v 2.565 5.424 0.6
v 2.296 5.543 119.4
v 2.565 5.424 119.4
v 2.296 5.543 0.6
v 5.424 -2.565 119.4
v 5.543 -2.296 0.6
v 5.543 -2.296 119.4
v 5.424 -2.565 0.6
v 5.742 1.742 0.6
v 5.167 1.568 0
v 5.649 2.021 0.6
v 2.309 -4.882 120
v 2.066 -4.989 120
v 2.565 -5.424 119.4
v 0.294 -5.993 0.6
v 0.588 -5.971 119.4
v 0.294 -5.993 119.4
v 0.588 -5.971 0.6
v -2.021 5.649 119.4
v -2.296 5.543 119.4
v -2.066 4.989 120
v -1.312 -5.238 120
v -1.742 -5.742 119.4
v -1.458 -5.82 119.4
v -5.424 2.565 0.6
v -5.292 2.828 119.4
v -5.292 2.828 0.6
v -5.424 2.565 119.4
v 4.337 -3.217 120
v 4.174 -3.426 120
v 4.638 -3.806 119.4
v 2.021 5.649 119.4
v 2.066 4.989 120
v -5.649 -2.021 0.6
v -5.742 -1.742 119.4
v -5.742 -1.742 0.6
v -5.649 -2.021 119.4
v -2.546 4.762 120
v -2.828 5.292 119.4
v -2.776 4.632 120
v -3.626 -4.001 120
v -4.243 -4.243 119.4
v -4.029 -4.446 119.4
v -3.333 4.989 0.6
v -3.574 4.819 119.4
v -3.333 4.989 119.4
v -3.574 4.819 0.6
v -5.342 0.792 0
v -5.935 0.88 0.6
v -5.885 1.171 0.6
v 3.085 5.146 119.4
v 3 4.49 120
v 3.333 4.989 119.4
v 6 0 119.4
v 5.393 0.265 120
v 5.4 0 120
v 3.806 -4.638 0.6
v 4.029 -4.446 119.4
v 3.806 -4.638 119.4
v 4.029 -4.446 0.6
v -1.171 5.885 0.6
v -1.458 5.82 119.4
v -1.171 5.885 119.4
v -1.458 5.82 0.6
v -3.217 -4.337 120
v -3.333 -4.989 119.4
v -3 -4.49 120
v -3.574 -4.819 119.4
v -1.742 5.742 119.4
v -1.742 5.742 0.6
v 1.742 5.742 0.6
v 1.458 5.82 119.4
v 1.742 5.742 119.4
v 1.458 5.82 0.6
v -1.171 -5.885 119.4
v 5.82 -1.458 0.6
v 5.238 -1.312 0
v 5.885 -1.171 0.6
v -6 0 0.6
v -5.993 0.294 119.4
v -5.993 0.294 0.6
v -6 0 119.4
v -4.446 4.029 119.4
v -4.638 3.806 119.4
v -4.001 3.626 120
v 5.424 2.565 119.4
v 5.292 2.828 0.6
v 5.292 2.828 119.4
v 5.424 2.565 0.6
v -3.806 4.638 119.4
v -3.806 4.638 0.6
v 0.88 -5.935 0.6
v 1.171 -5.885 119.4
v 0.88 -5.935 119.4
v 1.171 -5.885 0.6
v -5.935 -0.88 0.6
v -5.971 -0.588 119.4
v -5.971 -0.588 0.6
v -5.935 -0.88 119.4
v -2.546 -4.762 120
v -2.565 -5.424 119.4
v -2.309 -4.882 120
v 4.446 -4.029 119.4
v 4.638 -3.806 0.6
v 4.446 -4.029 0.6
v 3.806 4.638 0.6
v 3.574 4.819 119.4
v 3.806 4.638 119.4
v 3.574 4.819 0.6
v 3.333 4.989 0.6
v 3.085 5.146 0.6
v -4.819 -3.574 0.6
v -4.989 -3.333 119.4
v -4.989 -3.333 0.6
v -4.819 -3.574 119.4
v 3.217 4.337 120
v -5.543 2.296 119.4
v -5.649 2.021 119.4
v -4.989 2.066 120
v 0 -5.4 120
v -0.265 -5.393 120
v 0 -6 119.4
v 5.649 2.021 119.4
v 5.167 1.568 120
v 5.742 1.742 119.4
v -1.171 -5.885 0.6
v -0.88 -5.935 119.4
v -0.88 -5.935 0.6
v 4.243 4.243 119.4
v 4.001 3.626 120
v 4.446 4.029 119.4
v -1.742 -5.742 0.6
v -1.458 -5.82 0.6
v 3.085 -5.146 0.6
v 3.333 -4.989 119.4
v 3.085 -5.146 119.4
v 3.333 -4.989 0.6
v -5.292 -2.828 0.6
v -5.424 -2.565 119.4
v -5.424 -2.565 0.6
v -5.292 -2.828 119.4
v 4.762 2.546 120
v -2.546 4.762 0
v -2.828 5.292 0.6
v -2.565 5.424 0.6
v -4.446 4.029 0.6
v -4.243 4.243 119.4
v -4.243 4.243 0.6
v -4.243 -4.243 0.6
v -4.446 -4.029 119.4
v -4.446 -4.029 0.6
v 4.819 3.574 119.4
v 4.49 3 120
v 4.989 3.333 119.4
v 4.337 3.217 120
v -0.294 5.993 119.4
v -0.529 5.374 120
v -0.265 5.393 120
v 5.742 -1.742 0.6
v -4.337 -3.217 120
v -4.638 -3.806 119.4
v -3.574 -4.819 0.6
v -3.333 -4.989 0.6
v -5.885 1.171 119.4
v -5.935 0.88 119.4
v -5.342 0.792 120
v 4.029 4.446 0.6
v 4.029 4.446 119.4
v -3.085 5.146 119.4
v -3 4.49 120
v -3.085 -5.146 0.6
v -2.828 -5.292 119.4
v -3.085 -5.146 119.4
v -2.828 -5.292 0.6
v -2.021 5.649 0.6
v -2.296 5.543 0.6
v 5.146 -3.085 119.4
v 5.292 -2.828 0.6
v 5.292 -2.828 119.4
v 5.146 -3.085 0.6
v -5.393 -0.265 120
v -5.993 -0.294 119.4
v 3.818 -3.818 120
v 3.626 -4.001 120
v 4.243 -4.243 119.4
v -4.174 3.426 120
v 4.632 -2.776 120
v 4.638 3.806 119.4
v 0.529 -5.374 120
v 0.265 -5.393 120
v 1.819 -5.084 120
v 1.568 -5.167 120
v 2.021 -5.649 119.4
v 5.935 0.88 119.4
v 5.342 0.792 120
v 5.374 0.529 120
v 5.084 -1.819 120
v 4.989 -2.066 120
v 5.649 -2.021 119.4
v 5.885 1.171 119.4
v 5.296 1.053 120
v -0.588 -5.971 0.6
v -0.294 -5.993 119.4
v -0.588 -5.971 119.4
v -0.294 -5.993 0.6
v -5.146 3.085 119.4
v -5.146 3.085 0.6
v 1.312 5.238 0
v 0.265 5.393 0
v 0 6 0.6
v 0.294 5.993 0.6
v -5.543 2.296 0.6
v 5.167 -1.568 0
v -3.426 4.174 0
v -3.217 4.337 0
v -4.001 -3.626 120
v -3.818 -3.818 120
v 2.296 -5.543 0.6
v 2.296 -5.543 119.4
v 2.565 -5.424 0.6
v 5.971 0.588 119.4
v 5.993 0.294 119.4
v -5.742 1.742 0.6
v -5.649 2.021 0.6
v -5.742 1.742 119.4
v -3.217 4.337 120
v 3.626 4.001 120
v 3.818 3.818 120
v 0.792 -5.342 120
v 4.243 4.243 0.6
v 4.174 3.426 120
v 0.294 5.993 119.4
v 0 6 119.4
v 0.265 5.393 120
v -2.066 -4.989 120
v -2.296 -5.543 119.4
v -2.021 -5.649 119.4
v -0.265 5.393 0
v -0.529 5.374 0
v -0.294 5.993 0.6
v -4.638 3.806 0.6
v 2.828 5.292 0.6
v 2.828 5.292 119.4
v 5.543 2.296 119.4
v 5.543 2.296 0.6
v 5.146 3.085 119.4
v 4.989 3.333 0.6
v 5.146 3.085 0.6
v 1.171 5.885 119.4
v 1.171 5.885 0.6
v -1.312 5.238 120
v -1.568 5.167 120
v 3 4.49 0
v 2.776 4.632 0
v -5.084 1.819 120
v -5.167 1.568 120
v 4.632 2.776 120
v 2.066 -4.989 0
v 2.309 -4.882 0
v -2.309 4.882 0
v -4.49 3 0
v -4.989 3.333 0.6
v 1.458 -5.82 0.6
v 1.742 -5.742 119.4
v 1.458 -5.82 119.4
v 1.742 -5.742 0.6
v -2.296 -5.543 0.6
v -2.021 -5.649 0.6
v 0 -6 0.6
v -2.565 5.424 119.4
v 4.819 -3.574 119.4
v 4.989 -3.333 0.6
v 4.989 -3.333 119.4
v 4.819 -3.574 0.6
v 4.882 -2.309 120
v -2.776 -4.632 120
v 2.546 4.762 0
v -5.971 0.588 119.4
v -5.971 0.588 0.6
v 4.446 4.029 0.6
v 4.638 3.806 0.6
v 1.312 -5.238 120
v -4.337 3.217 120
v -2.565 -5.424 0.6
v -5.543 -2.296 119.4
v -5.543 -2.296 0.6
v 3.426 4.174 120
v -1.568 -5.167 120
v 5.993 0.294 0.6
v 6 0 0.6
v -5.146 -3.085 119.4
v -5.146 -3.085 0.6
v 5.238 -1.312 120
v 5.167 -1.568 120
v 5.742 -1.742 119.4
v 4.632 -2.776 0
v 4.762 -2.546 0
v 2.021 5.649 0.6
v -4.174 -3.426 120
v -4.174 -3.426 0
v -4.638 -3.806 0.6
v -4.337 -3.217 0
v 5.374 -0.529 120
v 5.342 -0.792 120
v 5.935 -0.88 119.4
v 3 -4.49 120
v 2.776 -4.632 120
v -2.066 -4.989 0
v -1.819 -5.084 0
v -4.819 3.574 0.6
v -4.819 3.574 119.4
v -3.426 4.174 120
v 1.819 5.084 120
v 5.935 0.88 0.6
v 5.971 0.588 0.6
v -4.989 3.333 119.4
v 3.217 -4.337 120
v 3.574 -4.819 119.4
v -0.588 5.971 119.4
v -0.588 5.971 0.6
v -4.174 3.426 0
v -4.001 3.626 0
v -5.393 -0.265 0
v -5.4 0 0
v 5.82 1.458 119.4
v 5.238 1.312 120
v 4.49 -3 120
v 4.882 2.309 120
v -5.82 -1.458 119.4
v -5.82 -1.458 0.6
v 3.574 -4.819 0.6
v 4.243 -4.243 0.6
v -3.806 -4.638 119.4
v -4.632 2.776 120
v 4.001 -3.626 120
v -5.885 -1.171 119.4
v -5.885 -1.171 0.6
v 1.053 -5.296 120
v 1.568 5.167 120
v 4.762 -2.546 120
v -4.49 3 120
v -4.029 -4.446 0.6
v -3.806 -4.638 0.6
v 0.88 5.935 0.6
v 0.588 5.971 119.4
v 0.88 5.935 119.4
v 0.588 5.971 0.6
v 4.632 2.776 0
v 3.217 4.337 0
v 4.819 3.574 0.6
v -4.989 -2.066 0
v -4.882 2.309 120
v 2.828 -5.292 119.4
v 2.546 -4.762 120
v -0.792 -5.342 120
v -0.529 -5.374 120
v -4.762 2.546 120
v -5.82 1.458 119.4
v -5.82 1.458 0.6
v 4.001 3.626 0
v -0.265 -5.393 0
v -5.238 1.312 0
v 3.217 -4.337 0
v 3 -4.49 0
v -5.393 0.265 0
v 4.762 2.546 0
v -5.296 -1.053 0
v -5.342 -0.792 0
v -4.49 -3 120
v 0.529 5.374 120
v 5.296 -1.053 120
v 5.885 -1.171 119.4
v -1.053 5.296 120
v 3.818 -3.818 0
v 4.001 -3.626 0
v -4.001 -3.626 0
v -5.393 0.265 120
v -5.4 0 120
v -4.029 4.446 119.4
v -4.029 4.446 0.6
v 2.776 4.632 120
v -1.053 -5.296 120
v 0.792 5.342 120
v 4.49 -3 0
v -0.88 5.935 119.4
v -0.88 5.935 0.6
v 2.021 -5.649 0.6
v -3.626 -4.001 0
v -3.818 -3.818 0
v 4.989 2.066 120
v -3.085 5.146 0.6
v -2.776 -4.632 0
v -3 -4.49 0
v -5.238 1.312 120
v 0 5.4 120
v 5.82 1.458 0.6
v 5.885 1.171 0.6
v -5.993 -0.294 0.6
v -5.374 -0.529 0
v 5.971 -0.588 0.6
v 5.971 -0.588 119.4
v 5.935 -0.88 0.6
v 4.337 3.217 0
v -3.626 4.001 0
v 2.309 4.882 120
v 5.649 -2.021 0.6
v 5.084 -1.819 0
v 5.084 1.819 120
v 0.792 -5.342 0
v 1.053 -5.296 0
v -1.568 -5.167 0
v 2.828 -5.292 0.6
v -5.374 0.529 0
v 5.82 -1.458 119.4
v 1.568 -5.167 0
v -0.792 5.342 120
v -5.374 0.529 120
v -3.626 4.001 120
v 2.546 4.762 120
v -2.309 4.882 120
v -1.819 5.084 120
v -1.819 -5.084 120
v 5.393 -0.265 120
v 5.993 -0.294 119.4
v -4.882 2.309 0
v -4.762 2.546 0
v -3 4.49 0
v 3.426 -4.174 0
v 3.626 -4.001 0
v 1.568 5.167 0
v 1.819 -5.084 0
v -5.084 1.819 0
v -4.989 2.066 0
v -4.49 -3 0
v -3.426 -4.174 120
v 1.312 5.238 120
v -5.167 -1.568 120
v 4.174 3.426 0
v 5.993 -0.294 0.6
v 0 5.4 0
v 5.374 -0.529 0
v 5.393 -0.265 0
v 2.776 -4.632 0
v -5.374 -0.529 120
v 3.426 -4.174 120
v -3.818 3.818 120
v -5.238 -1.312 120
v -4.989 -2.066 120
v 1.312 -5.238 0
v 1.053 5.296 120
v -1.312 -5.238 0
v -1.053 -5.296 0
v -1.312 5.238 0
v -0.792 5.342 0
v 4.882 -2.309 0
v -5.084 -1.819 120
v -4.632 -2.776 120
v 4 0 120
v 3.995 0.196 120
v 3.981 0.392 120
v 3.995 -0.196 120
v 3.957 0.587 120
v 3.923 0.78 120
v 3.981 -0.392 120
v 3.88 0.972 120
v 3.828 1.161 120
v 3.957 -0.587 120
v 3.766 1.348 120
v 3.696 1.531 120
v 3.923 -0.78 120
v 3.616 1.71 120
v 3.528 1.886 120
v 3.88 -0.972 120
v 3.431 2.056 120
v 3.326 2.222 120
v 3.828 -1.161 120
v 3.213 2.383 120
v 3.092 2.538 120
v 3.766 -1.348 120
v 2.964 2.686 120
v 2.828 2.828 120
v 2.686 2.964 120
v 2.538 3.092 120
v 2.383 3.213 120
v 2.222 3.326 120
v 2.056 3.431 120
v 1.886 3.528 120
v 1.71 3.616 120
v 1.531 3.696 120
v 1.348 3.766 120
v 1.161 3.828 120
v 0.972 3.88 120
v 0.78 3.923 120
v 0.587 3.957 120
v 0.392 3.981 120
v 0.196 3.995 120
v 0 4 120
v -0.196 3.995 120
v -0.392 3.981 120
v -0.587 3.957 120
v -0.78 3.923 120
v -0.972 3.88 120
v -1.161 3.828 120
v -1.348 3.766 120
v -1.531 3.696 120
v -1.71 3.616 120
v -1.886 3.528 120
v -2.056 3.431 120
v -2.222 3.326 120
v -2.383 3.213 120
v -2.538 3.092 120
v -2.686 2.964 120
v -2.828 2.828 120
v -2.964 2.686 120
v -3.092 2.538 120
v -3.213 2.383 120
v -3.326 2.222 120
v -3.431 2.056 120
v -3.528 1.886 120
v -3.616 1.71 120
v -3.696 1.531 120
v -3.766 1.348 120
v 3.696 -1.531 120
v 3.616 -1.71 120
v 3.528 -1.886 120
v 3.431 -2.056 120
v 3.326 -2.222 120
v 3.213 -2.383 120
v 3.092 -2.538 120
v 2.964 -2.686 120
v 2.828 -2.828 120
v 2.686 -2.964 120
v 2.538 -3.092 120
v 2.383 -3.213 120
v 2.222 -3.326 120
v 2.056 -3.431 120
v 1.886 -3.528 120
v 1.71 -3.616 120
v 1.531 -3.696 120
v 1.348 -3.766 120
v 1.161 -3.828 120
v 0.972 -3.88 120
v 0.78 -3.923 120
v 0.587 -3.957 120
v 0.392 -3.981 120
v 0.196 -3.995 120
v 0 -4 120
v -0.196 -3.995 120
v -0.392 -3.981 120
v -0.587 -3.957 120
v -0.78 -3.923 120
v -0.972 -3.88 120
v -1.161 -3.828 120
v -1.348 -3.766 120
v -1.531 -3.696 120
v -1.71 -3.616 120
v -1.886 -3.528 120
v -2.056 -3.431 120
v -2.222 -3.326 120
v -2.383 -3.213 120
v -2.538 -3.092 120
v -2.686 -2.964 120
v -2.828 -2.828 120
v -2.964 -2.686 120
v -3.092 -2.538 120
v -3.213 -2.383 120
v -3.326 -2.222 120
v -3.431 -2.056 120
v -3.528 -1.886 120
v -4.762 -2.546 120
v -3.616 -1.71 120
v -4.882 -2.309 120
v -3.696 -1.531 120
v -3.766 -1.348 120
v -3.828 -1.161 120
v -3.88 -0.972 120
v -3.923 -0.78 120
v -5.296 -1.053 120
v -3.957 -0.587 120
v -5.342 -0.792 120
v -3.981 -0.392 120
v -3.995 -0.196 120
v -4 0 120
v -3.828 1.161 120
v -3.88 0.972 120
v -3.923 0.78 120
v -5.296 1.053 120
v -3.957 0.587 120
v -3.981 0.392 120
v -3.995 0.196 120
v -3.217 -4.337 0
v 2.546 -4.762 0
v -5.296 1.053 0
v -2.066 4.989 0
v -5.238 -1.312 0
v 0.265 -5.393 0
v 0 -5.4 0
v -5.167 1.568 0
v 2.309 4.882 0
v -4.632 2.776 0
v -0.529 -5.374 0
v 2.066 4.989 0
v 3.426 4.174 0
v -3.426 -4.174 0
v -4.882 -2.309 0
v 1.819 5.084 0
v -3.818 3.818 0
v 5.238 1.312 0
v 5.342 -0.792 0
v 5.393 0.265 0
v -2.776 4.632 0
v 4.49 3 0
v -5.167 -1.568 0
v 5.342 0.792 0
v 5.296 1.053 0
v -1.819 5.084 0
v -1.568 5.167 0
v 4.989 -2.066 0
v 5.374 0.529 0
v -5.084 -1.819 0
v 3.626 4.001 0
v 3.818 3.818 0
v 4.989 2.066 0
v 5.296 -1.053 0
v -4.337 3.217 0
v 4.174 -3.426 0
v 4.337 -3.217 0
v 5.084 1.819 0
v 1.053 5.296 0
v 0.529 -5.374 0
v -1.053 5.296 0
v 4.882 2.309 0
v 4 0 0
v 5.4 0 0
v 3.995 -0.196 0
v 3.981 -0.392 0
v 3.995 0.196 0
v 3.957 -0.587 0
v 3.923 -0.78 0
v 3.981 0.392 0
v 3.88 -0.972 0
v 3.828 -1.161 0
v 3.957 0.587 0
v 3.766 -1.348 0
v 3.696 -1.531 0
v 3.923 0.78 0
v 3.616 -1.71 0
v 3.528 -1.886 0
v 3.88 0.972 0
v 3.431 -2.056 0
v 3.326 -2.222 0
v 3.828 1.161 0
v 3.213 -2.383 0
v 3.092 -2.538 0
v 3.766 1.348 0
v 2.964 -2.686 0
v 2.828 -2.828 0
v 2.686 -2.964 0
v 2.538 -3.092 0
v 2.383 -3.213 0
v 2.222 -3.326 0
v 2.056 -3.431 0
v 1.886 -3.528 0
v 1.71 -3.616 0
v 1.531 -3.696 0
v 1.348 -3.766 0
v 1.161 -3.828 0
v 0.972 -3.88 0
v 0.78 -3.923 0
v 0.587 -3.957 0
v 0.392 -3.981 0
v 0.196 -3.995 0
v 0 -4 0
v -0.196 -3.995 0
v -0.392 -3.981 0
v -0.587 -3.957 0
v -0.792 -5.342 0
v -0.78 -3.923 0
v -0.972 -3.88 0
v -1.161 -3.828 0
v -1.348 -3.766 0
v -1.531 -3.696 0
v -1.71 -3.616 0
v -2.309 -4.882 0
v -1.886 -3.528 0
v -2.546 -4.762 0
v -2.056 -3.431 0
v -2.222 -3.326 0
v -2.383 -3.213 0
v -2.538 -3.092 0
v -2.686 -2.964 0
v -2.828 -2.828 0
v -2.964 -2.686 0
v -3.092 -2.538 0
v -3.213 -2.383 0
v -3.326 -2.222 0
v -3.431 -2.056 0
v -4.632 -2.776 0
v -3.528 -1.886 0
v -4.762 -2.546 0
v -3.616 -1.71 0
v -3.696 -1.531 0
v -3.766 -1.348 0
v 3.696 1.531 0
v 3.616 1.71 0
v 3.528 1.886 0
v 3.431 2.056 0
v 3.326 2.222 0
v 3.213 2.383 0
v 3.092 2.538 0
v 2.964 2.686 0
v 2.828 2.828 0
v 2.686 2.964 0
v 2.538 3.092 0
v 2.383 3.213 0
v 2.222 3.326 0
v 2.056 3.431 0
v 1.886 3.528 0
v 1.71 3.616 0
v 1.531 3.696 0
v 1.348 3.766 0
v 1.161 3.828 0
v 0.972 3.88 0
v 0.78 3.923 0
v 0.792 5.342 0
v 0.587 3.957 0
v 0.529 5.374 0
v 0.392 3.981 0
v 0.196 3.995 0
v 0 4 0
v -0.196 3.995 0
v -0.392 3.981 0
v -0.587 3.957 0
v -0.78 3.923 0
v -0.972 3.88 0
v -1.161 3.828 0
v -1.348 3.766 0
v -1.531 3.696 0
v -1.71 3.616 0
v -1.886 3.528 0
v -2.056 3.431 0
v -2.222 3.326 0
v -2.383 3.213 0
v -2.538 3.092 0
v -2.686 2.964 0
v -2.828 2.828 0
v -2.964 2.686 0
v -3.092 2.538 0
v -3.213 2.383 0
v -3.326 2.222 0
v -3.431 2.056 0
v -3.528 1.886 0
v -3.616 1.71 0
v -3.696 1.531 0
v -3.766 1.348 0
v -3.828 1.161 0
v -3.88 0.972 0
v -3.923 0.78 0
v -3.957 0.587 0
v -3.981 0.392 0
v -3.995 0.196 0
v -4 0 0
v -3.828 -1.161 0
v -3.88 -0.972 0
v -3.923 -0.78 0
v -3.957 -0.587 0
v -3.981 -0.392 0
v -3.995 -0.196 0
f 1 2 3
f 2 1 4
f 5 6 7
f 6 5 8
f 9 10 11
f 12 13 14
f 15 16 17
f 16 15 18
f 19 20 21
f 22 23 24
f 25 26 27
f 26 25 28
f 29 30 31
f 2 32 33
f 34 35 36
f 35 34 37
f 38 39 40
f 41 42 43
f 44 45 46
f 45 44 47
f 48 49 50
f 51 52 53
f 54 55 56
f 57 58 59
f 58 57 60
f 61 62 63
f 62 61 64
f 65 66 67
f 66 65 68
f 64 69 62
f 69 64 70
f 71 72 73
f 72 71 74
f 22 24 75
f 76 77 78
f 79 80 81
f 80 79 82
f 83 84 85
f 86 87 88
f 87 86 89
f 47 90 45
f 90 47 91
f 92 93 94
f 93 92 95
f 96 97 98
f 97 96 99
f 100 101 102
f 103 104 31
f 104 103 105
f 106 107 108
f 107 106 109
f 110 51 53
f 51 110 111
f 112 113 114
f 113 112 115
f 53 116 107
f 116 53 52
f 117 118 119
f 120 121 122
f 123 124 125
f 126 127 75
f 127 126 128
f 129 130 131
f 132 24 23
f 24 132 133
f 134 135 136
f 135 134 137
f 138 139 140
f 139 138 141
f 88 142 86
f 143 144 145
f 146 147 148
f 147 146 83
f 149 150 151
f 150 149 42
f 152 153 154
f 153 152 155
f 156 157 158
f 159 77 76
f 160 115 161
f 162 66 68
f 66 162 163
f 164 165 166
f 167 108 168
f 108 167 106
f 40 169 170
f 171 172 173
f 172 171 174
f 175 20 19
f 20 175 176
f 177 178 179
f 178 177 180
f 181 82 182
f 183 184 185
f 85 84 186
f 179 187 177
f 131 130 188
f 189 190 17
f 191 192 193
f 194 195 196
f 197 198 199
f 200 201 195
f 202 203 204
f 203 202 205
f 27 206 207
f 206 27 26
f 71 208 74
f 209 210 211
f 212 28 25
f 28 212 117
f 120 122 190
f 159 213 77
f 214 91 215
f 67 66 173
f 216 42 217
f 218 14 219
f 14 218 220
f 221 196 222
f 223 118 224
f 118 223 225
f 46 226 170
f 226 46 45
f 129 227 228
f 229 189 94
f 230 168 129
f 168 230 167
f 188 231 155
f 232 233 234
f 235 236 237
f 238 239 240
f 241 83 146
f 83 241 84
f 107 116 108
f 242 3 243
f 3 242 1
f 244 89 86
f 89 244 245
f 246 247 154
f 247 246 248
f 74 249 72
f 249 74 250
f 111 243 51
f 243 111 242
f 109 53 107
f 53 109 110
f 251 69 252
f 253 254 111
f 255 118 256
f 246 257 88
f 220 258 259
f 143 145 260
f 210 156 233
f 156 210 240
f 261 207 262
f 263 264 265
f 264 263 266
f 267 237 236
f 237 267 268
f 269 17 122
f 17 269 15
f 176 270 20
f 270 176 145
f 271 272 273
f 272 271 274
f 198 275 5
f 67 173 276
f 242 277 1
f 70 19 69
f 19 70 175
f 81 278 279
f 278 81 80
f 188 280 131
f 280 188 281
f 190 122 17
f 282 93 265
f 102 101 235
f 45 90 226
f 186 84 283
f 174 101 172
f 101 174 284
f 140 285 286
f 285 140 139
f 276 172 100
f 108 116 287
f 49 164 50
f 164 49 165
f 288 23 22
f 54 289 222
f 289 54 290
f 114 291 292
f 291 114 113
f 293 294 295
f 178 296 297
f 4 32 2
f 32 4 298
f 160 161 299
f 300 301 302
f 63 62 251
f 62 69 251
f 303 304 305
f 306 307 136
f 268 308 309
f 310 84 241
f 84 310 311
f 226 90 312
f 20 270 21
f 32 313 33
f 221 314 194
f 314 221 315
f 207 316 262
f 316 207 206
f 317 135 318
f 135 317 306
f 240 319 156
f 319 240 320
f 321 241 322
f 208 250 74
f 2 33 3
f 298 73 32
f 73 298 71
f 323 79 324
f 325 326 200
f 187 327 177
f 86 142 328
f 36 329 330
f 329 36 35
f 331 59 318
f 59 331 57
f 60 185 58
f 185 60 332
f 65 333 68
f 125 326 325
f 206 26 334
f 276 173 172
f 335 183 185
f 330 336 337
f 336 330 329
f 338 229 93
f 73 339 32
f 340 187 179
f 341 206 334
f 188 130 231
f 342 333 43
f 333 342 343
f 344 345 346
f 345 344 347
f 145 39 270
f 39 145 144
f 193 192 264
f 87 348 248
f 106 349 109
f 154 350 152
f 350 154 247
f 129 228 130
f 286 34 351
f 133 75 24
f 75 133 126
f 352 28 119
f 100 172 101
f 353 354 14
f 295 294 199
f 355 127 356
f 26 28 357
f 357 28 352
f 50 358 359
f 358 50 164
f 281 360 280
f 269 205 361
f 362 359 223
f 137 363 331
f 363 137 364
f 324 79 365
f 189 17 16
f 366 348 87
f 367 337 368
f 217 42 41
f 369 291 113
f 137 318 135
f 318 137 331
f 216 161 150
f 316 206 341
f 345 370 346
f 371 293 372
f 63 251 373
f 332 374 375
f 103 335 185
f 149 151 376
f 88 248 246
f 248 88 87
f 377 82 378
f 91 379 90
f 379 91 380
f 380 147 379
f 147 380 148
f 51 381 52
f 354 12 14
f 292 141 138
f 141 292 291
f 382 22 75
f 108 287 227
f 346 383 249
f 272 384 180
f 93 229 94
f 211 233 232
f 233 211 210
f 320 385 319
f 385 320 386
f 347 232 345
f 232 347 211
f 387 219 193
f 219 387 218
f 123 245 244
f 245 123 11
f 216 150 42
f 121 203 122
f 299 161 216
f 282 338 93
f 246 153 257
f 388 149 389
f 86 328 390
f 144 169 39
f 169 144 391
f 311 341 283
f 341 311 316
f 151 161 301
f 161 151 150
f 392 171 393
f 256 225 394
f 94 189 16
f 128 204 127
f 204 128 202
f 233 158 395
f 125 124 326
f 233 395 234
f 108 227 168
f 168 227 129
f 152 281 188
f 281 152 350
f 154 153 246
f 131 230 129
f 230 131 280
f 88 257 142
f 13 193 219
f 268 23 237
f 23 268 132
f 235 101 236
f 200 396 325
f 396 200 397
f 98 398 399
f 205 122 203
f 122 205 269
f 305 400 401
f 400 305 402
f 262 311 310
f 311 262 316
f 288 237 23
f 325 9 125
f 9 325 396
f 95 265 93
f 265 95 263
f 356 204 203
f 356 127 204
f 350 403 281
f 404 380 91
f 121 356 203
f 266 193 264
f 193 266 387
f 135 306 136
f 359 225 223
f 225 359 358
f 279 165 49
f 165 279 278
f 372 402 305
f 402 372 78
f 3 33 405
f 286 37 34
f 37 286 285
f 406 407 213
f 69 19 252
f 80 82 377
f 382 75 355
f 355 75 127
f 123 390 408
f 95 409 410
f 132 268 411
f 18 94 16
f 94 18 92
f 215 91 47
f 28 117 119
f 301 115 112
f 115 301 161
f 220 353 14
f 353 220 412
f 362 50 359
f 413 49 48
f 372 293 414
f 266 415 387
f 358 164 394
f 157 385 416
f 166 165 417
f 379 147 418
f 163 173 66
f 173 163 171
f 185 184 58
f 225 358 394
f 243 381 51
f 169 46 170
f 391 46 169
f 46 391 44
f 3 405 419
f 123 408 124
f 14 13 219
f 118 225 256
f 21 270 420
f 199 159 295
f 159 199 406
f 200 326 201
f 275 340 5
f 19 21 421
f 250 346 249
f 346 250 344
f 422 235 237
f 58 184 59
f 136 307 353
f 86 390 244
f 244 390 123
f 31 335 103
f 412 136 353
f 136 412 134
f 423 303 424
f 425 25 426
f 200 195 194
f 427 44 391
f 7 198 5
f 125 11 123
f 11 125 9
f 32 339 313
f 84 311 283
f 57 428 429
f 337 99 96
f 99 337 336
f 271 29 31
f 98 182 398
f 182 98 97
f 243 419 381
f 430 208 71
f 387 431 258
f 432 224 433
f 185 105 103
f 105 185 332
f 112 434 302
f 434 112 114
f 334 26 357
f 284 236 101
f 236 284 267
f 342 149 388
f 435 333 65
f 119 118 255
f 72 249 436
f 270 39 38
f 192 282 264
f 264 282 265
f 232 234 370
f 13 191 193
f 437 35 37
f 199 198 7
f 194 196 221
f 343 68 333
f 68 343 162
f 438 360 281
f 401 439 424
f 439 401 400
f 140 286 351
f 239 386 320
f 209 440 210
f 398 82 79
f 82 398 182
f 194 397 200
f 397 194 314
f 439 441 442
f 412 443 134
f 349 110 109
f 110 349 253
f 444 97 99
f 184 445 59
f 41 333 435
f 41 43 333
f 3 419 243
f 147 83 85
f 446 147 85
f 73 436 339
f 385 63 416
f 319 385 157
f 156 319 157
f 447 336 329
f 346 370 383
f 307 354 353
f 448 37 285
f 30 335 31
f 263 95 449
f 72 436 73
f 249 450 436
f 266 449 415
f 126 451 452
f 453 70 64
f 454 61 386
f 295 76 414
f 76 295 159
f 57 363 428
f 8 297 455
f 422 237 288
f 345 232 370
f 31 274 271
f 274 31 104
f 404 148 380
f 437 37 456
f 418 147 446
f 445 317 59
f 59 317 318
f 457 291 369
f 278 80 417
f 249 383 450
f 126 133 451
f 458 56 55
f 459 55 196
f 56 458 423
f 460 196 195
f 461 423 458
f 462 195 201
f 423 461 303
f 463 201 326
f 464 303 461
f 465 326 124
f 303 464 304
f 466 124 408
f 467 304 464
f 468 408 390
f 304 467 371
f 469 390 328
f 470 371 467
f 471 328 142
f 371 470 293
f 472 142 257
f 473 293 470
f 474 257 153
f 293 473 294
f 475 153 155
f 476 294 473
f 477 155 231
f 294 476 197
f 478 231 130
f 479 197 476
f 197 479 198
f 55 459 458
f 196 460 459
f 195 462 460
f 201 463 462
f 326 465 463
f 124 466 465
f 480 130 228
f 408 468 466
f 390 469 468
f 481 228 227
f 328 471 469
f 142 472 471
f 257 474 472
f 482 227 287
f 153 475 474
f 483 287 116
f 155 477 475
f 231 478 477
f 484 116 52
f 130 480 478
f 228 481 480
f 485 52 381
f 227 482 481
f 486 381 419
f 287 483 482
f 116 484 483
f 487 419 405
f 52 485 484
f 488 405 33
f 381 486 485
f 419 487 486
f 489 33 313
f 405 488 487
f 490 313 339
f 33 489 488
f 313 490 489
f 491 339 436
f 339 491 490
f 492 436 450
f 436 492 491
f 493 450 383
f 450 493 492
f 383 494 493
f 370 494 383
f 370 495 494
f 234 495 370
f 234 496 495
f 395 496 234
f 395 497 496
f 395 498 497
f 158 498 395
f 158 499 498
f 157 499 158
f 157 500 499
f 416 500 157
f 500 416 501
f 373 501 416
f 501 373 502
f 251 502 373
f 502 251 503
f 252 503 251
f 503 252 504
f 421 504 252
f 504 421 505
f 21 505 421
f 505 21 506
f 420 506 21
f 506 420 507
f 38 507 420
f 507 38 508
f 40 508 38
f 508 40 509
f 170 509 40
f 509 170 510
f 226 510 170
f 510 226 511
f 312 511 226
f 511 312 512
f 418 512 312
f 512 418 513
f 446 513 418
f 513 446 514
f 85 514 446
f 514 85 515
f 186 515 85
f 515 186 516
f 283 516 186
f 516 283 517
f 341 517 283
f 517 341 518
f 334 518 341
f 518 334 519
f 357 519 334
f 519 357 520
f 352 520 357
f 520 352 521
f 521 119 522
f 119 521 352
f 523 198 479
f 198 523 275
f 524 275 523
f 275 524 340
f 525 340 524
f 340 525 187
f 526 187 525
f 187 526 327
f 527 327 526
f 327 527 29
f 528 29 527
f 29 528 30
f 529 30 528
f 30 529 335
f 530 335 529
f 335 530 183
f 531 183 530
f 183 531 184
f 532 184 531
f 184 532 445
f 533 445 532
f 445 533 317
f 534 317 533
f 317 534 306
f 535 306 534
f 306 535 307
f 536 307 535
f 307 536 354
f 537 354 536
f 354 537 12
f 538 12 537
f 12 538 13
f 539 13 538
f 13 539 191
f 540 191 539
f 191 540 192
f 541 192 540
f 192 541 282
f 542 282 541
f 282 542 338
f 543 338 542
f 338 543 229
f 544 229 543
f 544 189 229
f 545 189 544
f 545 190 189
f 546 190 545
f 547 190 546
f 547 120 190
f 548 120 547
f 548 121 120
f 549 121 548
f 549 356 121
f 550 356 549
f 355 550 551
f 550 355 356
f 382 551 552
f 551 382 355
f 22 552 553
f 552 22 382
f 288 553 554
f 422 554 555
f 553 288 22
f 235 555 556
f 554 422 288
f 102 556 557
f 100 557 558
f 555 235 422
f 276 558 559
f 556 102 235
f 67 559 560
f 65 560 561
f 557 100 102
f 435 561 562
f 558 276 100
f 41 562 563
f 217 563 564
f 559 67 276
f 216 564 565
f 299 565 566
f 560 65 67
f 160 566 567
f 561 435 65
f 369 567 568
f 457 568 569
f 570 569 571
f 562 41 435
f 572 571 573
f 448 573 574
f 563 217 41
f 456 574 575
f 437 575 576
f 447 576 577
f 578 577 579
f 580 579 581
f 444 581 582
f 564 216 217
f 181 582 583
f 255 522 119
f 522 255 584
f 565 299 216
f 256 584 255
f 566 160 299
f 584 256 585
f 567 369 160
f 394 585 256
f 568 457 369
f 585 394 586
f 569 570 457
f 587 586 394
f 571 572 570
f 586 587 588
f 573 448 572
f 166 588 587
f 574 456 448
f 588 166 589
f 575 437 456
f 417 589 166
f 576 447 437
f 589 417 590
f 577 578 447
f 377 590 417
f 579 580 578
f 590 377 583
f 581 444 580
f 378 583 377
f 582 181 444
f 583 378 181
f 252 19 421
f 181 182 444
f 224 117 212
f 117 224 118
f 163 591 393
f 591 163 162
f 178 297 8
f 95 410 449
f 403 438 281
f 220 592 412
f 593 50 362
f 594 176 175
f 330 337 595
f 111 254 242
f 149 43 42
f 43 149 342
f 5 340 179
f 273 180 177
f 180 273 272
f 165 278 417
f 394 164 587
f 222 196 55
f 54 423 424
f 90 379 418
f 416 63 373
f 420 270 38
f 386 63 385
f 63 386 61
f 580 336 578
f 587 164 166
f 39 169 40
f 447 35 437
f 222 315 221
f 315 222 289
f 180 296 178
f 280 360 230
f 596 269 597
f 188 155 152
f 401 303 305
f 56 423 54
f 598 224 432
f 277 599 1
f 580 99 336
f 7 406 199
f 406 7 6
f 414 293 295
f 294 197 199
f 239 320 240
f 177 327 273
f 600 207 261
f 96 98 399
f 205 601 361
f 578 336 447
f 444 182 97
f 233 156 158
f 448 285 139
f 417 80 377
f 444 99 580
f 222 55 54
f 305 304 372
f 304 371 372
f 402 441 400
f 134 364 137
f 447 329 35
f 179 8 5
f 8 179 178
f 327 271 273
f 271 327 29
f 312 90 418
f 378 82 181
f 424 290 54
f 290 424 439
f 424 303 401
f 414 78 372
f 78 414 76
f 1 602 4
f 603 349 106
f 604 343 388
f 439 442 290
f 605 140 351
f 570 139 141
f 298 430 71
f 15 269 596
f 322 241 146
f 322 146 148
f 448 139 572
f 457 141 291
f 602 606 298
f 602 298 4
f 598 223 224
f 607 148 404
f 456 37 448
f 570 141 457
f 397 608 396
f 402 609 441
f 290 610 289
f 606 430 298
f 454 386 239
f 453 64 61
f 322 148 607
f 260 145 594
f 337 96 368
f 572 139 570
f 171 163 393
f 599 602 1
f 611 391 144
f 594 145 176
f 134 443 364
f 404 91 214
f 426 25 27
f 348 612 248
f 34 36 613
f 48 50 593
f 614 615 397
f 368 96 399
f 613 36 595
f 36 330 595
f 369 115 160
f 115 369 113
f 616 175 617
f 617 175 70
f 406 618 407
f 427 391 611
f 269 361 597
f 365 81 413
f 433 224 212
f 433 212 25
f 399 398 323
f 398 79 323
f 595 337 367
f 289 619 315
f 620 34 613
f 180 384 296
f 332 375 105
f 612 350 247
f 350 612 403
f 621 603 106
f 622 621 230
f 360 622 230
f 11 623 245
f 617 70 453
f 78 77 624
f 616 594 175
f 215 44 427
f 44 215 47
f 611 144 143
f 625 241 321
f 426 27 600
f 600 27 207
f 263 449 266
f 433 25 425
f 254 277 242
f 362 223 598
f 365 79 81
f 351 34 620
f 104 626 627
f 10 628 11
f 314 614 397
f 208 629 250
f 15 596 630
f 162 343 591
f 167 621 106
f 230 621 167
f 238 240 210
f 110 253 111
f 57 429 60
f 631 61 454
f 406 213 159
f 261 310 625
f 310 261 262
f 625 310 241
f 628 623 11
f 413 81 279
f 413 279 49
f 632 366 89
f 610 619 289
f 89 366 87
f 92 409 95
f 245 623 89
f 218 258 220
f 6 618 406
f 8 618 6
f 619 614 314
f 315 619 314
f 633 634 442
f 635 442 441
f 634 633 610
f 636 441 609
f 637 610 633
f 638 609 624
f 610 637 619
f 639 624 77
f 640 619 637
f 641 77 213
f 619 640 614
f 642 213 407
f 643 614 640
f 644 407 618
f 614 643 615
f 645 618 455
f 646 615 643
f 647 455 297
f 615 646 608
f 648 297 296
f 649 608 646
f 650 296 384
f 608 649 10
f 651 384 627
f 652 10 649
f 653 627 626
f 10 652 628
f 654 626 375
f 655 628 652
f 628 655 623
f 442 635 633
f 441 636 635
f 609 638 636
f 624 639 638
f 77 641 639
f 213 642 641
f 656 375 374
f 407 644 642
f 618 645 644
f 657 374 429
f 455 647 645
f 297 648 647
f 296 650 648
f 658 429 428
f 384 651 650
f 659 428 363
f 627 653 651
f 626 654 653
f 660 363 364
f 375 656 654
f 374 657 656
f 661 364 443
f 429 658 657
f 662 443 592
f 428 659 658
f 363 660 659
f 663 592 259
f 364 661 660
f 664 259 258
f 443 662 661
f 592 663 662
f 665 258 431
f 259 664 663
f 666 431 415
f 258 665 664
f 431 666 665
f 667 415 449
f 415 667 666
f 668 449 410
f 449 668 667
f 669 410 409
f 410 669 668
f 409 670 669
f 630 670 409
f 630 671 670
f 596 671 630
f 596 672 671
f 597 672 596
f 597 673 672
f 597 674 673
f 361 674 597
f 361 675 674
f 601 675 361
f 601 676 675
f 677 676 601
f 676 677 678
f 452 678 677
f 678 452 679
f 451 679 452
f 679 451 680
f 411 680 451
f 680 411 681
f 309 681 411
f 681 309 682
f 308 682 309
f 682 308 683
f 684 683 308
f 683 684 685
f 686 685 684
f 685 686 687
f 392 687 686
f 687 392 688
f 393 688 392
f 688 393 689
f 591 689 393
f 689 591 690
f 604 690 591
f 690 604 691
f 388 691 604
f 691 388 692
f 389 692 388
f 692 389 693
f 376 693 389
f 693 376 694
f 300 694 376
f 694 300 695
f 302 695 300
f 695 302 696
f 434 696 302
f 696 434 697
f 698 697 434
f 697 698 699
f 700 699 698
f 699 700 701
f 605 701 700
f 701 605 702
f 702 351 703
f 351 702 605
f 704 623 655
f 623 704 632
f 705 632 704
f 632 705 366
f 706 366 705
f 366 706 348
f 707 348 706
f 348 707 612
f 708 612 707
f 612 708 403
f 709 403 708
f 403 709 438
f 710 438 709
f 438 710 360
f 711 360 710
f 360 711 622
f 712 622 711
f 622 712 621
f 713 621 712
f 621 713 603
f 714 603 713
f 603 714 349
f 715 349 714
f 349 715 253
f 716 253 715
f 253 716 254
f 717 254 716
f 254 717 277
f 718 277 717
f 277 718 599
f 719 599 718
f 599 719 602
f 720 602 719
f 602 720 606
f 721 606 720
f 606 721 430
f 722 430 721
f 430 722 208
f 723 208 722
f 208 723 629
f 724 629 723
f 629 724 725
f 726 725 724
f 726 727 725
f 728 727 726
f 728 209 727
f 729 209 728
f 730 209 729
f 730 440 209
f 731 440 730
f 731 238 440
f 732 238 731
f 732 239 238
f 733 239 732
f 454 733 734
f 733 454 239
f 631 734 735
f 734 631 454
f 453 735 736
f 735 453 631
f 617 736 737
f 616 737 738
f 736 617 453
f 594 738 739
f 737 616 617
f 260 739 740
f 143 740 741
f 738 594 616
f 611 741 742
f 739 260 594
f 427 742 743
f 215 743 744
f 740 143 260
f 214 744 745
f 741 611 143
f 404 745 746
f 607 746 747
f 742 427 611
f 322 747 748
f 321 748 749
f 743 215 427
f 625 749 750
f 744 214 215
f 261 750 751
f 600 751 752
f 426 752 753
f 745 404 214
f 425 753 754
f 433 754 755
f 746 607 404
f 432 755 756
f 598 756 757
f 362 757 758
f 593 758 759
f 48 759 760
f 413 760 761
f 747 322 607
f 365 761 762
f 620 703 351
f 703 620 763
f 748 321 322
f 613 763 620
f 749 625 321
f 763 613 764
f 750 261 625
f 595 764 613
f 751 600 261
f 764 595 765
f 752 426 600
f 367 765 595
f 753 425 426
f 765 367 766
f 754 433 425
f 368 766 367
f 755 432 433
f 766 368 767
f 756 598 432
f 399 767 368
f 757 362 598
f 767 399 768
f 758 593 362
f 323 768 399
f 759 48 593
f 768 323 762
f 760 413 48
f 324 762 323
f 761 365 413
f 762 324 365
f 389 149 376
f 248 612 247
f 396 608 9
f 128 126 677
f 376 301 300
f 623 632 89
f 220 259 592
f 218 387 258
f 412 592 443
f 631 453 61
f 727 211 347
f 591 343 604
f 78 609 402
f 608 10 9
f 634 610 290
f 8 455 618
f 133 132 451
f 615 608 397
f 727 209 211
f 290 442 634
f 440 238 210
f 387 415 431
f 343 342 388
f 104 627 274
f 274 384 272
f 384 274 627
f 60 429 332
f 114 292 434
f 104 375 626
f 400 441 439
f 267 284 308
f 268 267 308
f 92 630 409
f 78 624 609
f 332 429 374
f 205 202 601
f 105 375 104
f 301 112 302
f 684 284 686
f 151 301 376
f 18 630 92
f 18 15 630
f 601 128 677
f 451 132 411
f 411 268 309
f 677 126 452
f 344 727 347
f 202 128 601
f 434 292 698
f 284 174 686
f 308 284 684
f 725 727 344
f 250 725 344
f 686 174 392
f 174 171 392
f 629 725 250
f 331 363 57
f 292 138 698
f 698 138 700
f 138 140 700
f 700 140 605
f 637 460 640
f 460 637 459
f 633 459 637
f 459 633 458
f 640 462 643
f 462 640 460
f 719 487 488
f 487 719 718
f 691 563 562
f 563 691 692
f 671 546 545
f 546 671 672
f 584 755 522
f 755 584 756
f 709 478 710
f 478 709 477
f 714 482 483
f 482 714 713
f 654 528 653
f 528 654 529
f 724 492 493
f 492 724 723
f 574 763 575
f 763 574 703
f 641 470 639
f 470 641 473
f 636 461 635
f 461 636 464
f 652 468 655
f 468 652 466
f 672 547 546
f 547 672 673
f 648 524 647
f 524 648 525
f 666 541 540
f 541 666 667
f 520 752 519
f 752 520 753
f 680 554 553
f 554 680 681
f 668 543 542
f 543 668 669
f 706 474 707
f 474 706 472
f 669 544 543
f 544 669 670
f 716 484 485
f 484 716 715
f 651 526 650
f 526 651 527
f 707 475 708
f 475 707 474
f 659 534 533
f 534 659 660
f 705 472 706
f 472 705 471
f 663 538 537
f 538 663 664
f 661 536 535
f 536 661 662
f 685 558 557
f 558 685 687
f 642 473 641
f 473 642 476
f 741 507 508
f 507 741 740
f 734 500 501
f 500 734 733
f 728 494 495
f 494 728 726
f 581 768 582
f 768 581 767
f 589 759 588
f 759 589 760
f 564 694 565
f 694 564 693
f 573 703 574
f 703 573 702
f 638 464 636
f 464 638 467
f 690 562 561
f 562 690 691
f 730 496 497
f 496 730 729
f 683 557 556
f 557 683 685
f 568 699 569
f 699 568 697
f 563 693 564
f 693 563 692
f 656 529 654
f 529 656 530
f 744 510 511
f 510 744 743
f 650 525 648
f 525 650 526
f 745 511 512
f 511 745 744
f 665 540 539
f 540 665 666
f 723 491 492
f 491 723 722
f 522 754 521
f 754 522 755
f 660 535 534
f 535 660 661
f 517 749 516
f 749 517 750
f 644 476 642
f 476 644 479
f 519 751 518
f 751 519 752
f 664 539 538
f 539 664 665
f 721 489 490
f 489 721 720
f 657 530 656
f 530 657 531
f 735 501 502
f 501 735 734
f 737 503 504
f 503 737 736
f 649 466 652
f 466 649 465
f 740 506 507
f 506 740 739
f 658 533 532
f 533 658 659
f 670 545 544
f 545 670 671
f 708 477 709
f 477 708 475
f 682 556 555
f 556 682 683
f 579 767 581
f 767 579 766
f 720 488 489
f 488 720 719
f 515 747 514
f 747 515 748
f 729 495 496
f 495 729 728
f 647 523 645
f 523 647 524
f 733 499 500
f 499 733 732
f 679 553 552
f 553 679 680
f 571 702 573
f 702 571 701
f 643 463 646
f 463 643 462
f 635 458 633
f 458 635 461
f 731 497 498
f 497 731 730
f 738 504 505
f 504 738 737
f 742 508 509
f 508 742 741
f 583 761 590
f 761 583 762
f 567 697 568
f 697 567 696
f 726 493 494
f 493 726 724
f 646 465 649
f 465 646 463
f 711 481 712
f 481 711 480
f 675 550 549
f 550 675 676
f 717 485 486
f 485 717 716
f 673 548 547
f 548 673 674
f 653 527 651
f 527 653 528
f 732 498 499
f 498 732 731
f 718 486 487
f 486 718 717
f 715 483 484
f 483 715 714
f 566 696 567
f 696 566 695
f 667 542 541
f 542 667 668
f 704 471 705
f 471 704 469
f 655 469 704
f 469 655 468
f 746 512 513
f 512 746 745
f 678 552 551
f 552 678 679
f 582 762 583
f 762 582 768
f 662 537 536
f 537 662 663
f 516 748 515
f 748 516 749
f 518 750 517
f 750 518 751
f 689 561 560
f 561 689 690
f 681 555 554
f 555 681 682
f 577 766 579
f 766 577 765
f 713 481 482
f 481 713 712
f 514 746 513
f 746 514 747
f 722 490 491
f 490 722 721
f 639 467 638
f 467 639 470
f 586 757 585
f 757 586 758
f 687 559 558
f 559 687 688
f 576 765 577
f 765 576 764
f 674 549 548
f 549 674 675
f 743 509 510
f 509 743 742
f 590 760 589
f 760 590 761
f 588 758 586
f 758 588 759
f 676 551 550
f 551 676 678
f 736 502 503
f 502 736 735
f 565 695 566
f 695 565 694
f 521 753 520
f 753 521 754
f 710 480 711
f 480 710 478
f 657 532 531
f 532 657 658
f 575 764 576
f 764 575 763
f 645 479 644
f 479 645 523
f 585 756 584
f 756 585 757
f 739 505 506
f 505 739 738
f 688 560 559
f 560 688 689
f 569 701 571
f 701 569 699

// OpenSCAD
$fn = 128;

// Neoprene tubing (generic): hollow cylinder
// Units: mm

outer_diameter = 12;   // OD
inner_diameter = 8;    // ID
length = 120;          // tube length

// Optional: slight end chamfer for a more realistic cut
chamfer = 0.6;         // set to 0 for sharp ends

module neoprene_tube(od, id, L, ch=0) {
    assert(od > id, "Outer diameter must be greater than inner diameter.");
    assert(L > 0, "Length must be positive.");
    assert(ch >= 0, "Chamfer must be non-negative.");
    ch_eff = min(ch, (od-id)/4, L/4);

    difference() {
        // Outer body with optional chamfer
        if (ch_eff > 0) {
            hull() {
                translate([0,0,ch_eff]) cylinder(h=L-2*ch_eff, d=od);
                cylinder(h=0.01, d=od-2*ch_eff);
                translate([0,0,L-0.01]) cylinder(h=0.01, d=od-2*ch_eff);
            }
        } else {
            cylinder(h=L, d=od);
        }

        // Inner bore (slightly extended to ensure clean subtraction)
        translate([0,0,-0.5]) cylinder(h=L+1, d=id);
    }
}

neoprene_tube(outer_diameter, inner_diameter, length, chamfer);
